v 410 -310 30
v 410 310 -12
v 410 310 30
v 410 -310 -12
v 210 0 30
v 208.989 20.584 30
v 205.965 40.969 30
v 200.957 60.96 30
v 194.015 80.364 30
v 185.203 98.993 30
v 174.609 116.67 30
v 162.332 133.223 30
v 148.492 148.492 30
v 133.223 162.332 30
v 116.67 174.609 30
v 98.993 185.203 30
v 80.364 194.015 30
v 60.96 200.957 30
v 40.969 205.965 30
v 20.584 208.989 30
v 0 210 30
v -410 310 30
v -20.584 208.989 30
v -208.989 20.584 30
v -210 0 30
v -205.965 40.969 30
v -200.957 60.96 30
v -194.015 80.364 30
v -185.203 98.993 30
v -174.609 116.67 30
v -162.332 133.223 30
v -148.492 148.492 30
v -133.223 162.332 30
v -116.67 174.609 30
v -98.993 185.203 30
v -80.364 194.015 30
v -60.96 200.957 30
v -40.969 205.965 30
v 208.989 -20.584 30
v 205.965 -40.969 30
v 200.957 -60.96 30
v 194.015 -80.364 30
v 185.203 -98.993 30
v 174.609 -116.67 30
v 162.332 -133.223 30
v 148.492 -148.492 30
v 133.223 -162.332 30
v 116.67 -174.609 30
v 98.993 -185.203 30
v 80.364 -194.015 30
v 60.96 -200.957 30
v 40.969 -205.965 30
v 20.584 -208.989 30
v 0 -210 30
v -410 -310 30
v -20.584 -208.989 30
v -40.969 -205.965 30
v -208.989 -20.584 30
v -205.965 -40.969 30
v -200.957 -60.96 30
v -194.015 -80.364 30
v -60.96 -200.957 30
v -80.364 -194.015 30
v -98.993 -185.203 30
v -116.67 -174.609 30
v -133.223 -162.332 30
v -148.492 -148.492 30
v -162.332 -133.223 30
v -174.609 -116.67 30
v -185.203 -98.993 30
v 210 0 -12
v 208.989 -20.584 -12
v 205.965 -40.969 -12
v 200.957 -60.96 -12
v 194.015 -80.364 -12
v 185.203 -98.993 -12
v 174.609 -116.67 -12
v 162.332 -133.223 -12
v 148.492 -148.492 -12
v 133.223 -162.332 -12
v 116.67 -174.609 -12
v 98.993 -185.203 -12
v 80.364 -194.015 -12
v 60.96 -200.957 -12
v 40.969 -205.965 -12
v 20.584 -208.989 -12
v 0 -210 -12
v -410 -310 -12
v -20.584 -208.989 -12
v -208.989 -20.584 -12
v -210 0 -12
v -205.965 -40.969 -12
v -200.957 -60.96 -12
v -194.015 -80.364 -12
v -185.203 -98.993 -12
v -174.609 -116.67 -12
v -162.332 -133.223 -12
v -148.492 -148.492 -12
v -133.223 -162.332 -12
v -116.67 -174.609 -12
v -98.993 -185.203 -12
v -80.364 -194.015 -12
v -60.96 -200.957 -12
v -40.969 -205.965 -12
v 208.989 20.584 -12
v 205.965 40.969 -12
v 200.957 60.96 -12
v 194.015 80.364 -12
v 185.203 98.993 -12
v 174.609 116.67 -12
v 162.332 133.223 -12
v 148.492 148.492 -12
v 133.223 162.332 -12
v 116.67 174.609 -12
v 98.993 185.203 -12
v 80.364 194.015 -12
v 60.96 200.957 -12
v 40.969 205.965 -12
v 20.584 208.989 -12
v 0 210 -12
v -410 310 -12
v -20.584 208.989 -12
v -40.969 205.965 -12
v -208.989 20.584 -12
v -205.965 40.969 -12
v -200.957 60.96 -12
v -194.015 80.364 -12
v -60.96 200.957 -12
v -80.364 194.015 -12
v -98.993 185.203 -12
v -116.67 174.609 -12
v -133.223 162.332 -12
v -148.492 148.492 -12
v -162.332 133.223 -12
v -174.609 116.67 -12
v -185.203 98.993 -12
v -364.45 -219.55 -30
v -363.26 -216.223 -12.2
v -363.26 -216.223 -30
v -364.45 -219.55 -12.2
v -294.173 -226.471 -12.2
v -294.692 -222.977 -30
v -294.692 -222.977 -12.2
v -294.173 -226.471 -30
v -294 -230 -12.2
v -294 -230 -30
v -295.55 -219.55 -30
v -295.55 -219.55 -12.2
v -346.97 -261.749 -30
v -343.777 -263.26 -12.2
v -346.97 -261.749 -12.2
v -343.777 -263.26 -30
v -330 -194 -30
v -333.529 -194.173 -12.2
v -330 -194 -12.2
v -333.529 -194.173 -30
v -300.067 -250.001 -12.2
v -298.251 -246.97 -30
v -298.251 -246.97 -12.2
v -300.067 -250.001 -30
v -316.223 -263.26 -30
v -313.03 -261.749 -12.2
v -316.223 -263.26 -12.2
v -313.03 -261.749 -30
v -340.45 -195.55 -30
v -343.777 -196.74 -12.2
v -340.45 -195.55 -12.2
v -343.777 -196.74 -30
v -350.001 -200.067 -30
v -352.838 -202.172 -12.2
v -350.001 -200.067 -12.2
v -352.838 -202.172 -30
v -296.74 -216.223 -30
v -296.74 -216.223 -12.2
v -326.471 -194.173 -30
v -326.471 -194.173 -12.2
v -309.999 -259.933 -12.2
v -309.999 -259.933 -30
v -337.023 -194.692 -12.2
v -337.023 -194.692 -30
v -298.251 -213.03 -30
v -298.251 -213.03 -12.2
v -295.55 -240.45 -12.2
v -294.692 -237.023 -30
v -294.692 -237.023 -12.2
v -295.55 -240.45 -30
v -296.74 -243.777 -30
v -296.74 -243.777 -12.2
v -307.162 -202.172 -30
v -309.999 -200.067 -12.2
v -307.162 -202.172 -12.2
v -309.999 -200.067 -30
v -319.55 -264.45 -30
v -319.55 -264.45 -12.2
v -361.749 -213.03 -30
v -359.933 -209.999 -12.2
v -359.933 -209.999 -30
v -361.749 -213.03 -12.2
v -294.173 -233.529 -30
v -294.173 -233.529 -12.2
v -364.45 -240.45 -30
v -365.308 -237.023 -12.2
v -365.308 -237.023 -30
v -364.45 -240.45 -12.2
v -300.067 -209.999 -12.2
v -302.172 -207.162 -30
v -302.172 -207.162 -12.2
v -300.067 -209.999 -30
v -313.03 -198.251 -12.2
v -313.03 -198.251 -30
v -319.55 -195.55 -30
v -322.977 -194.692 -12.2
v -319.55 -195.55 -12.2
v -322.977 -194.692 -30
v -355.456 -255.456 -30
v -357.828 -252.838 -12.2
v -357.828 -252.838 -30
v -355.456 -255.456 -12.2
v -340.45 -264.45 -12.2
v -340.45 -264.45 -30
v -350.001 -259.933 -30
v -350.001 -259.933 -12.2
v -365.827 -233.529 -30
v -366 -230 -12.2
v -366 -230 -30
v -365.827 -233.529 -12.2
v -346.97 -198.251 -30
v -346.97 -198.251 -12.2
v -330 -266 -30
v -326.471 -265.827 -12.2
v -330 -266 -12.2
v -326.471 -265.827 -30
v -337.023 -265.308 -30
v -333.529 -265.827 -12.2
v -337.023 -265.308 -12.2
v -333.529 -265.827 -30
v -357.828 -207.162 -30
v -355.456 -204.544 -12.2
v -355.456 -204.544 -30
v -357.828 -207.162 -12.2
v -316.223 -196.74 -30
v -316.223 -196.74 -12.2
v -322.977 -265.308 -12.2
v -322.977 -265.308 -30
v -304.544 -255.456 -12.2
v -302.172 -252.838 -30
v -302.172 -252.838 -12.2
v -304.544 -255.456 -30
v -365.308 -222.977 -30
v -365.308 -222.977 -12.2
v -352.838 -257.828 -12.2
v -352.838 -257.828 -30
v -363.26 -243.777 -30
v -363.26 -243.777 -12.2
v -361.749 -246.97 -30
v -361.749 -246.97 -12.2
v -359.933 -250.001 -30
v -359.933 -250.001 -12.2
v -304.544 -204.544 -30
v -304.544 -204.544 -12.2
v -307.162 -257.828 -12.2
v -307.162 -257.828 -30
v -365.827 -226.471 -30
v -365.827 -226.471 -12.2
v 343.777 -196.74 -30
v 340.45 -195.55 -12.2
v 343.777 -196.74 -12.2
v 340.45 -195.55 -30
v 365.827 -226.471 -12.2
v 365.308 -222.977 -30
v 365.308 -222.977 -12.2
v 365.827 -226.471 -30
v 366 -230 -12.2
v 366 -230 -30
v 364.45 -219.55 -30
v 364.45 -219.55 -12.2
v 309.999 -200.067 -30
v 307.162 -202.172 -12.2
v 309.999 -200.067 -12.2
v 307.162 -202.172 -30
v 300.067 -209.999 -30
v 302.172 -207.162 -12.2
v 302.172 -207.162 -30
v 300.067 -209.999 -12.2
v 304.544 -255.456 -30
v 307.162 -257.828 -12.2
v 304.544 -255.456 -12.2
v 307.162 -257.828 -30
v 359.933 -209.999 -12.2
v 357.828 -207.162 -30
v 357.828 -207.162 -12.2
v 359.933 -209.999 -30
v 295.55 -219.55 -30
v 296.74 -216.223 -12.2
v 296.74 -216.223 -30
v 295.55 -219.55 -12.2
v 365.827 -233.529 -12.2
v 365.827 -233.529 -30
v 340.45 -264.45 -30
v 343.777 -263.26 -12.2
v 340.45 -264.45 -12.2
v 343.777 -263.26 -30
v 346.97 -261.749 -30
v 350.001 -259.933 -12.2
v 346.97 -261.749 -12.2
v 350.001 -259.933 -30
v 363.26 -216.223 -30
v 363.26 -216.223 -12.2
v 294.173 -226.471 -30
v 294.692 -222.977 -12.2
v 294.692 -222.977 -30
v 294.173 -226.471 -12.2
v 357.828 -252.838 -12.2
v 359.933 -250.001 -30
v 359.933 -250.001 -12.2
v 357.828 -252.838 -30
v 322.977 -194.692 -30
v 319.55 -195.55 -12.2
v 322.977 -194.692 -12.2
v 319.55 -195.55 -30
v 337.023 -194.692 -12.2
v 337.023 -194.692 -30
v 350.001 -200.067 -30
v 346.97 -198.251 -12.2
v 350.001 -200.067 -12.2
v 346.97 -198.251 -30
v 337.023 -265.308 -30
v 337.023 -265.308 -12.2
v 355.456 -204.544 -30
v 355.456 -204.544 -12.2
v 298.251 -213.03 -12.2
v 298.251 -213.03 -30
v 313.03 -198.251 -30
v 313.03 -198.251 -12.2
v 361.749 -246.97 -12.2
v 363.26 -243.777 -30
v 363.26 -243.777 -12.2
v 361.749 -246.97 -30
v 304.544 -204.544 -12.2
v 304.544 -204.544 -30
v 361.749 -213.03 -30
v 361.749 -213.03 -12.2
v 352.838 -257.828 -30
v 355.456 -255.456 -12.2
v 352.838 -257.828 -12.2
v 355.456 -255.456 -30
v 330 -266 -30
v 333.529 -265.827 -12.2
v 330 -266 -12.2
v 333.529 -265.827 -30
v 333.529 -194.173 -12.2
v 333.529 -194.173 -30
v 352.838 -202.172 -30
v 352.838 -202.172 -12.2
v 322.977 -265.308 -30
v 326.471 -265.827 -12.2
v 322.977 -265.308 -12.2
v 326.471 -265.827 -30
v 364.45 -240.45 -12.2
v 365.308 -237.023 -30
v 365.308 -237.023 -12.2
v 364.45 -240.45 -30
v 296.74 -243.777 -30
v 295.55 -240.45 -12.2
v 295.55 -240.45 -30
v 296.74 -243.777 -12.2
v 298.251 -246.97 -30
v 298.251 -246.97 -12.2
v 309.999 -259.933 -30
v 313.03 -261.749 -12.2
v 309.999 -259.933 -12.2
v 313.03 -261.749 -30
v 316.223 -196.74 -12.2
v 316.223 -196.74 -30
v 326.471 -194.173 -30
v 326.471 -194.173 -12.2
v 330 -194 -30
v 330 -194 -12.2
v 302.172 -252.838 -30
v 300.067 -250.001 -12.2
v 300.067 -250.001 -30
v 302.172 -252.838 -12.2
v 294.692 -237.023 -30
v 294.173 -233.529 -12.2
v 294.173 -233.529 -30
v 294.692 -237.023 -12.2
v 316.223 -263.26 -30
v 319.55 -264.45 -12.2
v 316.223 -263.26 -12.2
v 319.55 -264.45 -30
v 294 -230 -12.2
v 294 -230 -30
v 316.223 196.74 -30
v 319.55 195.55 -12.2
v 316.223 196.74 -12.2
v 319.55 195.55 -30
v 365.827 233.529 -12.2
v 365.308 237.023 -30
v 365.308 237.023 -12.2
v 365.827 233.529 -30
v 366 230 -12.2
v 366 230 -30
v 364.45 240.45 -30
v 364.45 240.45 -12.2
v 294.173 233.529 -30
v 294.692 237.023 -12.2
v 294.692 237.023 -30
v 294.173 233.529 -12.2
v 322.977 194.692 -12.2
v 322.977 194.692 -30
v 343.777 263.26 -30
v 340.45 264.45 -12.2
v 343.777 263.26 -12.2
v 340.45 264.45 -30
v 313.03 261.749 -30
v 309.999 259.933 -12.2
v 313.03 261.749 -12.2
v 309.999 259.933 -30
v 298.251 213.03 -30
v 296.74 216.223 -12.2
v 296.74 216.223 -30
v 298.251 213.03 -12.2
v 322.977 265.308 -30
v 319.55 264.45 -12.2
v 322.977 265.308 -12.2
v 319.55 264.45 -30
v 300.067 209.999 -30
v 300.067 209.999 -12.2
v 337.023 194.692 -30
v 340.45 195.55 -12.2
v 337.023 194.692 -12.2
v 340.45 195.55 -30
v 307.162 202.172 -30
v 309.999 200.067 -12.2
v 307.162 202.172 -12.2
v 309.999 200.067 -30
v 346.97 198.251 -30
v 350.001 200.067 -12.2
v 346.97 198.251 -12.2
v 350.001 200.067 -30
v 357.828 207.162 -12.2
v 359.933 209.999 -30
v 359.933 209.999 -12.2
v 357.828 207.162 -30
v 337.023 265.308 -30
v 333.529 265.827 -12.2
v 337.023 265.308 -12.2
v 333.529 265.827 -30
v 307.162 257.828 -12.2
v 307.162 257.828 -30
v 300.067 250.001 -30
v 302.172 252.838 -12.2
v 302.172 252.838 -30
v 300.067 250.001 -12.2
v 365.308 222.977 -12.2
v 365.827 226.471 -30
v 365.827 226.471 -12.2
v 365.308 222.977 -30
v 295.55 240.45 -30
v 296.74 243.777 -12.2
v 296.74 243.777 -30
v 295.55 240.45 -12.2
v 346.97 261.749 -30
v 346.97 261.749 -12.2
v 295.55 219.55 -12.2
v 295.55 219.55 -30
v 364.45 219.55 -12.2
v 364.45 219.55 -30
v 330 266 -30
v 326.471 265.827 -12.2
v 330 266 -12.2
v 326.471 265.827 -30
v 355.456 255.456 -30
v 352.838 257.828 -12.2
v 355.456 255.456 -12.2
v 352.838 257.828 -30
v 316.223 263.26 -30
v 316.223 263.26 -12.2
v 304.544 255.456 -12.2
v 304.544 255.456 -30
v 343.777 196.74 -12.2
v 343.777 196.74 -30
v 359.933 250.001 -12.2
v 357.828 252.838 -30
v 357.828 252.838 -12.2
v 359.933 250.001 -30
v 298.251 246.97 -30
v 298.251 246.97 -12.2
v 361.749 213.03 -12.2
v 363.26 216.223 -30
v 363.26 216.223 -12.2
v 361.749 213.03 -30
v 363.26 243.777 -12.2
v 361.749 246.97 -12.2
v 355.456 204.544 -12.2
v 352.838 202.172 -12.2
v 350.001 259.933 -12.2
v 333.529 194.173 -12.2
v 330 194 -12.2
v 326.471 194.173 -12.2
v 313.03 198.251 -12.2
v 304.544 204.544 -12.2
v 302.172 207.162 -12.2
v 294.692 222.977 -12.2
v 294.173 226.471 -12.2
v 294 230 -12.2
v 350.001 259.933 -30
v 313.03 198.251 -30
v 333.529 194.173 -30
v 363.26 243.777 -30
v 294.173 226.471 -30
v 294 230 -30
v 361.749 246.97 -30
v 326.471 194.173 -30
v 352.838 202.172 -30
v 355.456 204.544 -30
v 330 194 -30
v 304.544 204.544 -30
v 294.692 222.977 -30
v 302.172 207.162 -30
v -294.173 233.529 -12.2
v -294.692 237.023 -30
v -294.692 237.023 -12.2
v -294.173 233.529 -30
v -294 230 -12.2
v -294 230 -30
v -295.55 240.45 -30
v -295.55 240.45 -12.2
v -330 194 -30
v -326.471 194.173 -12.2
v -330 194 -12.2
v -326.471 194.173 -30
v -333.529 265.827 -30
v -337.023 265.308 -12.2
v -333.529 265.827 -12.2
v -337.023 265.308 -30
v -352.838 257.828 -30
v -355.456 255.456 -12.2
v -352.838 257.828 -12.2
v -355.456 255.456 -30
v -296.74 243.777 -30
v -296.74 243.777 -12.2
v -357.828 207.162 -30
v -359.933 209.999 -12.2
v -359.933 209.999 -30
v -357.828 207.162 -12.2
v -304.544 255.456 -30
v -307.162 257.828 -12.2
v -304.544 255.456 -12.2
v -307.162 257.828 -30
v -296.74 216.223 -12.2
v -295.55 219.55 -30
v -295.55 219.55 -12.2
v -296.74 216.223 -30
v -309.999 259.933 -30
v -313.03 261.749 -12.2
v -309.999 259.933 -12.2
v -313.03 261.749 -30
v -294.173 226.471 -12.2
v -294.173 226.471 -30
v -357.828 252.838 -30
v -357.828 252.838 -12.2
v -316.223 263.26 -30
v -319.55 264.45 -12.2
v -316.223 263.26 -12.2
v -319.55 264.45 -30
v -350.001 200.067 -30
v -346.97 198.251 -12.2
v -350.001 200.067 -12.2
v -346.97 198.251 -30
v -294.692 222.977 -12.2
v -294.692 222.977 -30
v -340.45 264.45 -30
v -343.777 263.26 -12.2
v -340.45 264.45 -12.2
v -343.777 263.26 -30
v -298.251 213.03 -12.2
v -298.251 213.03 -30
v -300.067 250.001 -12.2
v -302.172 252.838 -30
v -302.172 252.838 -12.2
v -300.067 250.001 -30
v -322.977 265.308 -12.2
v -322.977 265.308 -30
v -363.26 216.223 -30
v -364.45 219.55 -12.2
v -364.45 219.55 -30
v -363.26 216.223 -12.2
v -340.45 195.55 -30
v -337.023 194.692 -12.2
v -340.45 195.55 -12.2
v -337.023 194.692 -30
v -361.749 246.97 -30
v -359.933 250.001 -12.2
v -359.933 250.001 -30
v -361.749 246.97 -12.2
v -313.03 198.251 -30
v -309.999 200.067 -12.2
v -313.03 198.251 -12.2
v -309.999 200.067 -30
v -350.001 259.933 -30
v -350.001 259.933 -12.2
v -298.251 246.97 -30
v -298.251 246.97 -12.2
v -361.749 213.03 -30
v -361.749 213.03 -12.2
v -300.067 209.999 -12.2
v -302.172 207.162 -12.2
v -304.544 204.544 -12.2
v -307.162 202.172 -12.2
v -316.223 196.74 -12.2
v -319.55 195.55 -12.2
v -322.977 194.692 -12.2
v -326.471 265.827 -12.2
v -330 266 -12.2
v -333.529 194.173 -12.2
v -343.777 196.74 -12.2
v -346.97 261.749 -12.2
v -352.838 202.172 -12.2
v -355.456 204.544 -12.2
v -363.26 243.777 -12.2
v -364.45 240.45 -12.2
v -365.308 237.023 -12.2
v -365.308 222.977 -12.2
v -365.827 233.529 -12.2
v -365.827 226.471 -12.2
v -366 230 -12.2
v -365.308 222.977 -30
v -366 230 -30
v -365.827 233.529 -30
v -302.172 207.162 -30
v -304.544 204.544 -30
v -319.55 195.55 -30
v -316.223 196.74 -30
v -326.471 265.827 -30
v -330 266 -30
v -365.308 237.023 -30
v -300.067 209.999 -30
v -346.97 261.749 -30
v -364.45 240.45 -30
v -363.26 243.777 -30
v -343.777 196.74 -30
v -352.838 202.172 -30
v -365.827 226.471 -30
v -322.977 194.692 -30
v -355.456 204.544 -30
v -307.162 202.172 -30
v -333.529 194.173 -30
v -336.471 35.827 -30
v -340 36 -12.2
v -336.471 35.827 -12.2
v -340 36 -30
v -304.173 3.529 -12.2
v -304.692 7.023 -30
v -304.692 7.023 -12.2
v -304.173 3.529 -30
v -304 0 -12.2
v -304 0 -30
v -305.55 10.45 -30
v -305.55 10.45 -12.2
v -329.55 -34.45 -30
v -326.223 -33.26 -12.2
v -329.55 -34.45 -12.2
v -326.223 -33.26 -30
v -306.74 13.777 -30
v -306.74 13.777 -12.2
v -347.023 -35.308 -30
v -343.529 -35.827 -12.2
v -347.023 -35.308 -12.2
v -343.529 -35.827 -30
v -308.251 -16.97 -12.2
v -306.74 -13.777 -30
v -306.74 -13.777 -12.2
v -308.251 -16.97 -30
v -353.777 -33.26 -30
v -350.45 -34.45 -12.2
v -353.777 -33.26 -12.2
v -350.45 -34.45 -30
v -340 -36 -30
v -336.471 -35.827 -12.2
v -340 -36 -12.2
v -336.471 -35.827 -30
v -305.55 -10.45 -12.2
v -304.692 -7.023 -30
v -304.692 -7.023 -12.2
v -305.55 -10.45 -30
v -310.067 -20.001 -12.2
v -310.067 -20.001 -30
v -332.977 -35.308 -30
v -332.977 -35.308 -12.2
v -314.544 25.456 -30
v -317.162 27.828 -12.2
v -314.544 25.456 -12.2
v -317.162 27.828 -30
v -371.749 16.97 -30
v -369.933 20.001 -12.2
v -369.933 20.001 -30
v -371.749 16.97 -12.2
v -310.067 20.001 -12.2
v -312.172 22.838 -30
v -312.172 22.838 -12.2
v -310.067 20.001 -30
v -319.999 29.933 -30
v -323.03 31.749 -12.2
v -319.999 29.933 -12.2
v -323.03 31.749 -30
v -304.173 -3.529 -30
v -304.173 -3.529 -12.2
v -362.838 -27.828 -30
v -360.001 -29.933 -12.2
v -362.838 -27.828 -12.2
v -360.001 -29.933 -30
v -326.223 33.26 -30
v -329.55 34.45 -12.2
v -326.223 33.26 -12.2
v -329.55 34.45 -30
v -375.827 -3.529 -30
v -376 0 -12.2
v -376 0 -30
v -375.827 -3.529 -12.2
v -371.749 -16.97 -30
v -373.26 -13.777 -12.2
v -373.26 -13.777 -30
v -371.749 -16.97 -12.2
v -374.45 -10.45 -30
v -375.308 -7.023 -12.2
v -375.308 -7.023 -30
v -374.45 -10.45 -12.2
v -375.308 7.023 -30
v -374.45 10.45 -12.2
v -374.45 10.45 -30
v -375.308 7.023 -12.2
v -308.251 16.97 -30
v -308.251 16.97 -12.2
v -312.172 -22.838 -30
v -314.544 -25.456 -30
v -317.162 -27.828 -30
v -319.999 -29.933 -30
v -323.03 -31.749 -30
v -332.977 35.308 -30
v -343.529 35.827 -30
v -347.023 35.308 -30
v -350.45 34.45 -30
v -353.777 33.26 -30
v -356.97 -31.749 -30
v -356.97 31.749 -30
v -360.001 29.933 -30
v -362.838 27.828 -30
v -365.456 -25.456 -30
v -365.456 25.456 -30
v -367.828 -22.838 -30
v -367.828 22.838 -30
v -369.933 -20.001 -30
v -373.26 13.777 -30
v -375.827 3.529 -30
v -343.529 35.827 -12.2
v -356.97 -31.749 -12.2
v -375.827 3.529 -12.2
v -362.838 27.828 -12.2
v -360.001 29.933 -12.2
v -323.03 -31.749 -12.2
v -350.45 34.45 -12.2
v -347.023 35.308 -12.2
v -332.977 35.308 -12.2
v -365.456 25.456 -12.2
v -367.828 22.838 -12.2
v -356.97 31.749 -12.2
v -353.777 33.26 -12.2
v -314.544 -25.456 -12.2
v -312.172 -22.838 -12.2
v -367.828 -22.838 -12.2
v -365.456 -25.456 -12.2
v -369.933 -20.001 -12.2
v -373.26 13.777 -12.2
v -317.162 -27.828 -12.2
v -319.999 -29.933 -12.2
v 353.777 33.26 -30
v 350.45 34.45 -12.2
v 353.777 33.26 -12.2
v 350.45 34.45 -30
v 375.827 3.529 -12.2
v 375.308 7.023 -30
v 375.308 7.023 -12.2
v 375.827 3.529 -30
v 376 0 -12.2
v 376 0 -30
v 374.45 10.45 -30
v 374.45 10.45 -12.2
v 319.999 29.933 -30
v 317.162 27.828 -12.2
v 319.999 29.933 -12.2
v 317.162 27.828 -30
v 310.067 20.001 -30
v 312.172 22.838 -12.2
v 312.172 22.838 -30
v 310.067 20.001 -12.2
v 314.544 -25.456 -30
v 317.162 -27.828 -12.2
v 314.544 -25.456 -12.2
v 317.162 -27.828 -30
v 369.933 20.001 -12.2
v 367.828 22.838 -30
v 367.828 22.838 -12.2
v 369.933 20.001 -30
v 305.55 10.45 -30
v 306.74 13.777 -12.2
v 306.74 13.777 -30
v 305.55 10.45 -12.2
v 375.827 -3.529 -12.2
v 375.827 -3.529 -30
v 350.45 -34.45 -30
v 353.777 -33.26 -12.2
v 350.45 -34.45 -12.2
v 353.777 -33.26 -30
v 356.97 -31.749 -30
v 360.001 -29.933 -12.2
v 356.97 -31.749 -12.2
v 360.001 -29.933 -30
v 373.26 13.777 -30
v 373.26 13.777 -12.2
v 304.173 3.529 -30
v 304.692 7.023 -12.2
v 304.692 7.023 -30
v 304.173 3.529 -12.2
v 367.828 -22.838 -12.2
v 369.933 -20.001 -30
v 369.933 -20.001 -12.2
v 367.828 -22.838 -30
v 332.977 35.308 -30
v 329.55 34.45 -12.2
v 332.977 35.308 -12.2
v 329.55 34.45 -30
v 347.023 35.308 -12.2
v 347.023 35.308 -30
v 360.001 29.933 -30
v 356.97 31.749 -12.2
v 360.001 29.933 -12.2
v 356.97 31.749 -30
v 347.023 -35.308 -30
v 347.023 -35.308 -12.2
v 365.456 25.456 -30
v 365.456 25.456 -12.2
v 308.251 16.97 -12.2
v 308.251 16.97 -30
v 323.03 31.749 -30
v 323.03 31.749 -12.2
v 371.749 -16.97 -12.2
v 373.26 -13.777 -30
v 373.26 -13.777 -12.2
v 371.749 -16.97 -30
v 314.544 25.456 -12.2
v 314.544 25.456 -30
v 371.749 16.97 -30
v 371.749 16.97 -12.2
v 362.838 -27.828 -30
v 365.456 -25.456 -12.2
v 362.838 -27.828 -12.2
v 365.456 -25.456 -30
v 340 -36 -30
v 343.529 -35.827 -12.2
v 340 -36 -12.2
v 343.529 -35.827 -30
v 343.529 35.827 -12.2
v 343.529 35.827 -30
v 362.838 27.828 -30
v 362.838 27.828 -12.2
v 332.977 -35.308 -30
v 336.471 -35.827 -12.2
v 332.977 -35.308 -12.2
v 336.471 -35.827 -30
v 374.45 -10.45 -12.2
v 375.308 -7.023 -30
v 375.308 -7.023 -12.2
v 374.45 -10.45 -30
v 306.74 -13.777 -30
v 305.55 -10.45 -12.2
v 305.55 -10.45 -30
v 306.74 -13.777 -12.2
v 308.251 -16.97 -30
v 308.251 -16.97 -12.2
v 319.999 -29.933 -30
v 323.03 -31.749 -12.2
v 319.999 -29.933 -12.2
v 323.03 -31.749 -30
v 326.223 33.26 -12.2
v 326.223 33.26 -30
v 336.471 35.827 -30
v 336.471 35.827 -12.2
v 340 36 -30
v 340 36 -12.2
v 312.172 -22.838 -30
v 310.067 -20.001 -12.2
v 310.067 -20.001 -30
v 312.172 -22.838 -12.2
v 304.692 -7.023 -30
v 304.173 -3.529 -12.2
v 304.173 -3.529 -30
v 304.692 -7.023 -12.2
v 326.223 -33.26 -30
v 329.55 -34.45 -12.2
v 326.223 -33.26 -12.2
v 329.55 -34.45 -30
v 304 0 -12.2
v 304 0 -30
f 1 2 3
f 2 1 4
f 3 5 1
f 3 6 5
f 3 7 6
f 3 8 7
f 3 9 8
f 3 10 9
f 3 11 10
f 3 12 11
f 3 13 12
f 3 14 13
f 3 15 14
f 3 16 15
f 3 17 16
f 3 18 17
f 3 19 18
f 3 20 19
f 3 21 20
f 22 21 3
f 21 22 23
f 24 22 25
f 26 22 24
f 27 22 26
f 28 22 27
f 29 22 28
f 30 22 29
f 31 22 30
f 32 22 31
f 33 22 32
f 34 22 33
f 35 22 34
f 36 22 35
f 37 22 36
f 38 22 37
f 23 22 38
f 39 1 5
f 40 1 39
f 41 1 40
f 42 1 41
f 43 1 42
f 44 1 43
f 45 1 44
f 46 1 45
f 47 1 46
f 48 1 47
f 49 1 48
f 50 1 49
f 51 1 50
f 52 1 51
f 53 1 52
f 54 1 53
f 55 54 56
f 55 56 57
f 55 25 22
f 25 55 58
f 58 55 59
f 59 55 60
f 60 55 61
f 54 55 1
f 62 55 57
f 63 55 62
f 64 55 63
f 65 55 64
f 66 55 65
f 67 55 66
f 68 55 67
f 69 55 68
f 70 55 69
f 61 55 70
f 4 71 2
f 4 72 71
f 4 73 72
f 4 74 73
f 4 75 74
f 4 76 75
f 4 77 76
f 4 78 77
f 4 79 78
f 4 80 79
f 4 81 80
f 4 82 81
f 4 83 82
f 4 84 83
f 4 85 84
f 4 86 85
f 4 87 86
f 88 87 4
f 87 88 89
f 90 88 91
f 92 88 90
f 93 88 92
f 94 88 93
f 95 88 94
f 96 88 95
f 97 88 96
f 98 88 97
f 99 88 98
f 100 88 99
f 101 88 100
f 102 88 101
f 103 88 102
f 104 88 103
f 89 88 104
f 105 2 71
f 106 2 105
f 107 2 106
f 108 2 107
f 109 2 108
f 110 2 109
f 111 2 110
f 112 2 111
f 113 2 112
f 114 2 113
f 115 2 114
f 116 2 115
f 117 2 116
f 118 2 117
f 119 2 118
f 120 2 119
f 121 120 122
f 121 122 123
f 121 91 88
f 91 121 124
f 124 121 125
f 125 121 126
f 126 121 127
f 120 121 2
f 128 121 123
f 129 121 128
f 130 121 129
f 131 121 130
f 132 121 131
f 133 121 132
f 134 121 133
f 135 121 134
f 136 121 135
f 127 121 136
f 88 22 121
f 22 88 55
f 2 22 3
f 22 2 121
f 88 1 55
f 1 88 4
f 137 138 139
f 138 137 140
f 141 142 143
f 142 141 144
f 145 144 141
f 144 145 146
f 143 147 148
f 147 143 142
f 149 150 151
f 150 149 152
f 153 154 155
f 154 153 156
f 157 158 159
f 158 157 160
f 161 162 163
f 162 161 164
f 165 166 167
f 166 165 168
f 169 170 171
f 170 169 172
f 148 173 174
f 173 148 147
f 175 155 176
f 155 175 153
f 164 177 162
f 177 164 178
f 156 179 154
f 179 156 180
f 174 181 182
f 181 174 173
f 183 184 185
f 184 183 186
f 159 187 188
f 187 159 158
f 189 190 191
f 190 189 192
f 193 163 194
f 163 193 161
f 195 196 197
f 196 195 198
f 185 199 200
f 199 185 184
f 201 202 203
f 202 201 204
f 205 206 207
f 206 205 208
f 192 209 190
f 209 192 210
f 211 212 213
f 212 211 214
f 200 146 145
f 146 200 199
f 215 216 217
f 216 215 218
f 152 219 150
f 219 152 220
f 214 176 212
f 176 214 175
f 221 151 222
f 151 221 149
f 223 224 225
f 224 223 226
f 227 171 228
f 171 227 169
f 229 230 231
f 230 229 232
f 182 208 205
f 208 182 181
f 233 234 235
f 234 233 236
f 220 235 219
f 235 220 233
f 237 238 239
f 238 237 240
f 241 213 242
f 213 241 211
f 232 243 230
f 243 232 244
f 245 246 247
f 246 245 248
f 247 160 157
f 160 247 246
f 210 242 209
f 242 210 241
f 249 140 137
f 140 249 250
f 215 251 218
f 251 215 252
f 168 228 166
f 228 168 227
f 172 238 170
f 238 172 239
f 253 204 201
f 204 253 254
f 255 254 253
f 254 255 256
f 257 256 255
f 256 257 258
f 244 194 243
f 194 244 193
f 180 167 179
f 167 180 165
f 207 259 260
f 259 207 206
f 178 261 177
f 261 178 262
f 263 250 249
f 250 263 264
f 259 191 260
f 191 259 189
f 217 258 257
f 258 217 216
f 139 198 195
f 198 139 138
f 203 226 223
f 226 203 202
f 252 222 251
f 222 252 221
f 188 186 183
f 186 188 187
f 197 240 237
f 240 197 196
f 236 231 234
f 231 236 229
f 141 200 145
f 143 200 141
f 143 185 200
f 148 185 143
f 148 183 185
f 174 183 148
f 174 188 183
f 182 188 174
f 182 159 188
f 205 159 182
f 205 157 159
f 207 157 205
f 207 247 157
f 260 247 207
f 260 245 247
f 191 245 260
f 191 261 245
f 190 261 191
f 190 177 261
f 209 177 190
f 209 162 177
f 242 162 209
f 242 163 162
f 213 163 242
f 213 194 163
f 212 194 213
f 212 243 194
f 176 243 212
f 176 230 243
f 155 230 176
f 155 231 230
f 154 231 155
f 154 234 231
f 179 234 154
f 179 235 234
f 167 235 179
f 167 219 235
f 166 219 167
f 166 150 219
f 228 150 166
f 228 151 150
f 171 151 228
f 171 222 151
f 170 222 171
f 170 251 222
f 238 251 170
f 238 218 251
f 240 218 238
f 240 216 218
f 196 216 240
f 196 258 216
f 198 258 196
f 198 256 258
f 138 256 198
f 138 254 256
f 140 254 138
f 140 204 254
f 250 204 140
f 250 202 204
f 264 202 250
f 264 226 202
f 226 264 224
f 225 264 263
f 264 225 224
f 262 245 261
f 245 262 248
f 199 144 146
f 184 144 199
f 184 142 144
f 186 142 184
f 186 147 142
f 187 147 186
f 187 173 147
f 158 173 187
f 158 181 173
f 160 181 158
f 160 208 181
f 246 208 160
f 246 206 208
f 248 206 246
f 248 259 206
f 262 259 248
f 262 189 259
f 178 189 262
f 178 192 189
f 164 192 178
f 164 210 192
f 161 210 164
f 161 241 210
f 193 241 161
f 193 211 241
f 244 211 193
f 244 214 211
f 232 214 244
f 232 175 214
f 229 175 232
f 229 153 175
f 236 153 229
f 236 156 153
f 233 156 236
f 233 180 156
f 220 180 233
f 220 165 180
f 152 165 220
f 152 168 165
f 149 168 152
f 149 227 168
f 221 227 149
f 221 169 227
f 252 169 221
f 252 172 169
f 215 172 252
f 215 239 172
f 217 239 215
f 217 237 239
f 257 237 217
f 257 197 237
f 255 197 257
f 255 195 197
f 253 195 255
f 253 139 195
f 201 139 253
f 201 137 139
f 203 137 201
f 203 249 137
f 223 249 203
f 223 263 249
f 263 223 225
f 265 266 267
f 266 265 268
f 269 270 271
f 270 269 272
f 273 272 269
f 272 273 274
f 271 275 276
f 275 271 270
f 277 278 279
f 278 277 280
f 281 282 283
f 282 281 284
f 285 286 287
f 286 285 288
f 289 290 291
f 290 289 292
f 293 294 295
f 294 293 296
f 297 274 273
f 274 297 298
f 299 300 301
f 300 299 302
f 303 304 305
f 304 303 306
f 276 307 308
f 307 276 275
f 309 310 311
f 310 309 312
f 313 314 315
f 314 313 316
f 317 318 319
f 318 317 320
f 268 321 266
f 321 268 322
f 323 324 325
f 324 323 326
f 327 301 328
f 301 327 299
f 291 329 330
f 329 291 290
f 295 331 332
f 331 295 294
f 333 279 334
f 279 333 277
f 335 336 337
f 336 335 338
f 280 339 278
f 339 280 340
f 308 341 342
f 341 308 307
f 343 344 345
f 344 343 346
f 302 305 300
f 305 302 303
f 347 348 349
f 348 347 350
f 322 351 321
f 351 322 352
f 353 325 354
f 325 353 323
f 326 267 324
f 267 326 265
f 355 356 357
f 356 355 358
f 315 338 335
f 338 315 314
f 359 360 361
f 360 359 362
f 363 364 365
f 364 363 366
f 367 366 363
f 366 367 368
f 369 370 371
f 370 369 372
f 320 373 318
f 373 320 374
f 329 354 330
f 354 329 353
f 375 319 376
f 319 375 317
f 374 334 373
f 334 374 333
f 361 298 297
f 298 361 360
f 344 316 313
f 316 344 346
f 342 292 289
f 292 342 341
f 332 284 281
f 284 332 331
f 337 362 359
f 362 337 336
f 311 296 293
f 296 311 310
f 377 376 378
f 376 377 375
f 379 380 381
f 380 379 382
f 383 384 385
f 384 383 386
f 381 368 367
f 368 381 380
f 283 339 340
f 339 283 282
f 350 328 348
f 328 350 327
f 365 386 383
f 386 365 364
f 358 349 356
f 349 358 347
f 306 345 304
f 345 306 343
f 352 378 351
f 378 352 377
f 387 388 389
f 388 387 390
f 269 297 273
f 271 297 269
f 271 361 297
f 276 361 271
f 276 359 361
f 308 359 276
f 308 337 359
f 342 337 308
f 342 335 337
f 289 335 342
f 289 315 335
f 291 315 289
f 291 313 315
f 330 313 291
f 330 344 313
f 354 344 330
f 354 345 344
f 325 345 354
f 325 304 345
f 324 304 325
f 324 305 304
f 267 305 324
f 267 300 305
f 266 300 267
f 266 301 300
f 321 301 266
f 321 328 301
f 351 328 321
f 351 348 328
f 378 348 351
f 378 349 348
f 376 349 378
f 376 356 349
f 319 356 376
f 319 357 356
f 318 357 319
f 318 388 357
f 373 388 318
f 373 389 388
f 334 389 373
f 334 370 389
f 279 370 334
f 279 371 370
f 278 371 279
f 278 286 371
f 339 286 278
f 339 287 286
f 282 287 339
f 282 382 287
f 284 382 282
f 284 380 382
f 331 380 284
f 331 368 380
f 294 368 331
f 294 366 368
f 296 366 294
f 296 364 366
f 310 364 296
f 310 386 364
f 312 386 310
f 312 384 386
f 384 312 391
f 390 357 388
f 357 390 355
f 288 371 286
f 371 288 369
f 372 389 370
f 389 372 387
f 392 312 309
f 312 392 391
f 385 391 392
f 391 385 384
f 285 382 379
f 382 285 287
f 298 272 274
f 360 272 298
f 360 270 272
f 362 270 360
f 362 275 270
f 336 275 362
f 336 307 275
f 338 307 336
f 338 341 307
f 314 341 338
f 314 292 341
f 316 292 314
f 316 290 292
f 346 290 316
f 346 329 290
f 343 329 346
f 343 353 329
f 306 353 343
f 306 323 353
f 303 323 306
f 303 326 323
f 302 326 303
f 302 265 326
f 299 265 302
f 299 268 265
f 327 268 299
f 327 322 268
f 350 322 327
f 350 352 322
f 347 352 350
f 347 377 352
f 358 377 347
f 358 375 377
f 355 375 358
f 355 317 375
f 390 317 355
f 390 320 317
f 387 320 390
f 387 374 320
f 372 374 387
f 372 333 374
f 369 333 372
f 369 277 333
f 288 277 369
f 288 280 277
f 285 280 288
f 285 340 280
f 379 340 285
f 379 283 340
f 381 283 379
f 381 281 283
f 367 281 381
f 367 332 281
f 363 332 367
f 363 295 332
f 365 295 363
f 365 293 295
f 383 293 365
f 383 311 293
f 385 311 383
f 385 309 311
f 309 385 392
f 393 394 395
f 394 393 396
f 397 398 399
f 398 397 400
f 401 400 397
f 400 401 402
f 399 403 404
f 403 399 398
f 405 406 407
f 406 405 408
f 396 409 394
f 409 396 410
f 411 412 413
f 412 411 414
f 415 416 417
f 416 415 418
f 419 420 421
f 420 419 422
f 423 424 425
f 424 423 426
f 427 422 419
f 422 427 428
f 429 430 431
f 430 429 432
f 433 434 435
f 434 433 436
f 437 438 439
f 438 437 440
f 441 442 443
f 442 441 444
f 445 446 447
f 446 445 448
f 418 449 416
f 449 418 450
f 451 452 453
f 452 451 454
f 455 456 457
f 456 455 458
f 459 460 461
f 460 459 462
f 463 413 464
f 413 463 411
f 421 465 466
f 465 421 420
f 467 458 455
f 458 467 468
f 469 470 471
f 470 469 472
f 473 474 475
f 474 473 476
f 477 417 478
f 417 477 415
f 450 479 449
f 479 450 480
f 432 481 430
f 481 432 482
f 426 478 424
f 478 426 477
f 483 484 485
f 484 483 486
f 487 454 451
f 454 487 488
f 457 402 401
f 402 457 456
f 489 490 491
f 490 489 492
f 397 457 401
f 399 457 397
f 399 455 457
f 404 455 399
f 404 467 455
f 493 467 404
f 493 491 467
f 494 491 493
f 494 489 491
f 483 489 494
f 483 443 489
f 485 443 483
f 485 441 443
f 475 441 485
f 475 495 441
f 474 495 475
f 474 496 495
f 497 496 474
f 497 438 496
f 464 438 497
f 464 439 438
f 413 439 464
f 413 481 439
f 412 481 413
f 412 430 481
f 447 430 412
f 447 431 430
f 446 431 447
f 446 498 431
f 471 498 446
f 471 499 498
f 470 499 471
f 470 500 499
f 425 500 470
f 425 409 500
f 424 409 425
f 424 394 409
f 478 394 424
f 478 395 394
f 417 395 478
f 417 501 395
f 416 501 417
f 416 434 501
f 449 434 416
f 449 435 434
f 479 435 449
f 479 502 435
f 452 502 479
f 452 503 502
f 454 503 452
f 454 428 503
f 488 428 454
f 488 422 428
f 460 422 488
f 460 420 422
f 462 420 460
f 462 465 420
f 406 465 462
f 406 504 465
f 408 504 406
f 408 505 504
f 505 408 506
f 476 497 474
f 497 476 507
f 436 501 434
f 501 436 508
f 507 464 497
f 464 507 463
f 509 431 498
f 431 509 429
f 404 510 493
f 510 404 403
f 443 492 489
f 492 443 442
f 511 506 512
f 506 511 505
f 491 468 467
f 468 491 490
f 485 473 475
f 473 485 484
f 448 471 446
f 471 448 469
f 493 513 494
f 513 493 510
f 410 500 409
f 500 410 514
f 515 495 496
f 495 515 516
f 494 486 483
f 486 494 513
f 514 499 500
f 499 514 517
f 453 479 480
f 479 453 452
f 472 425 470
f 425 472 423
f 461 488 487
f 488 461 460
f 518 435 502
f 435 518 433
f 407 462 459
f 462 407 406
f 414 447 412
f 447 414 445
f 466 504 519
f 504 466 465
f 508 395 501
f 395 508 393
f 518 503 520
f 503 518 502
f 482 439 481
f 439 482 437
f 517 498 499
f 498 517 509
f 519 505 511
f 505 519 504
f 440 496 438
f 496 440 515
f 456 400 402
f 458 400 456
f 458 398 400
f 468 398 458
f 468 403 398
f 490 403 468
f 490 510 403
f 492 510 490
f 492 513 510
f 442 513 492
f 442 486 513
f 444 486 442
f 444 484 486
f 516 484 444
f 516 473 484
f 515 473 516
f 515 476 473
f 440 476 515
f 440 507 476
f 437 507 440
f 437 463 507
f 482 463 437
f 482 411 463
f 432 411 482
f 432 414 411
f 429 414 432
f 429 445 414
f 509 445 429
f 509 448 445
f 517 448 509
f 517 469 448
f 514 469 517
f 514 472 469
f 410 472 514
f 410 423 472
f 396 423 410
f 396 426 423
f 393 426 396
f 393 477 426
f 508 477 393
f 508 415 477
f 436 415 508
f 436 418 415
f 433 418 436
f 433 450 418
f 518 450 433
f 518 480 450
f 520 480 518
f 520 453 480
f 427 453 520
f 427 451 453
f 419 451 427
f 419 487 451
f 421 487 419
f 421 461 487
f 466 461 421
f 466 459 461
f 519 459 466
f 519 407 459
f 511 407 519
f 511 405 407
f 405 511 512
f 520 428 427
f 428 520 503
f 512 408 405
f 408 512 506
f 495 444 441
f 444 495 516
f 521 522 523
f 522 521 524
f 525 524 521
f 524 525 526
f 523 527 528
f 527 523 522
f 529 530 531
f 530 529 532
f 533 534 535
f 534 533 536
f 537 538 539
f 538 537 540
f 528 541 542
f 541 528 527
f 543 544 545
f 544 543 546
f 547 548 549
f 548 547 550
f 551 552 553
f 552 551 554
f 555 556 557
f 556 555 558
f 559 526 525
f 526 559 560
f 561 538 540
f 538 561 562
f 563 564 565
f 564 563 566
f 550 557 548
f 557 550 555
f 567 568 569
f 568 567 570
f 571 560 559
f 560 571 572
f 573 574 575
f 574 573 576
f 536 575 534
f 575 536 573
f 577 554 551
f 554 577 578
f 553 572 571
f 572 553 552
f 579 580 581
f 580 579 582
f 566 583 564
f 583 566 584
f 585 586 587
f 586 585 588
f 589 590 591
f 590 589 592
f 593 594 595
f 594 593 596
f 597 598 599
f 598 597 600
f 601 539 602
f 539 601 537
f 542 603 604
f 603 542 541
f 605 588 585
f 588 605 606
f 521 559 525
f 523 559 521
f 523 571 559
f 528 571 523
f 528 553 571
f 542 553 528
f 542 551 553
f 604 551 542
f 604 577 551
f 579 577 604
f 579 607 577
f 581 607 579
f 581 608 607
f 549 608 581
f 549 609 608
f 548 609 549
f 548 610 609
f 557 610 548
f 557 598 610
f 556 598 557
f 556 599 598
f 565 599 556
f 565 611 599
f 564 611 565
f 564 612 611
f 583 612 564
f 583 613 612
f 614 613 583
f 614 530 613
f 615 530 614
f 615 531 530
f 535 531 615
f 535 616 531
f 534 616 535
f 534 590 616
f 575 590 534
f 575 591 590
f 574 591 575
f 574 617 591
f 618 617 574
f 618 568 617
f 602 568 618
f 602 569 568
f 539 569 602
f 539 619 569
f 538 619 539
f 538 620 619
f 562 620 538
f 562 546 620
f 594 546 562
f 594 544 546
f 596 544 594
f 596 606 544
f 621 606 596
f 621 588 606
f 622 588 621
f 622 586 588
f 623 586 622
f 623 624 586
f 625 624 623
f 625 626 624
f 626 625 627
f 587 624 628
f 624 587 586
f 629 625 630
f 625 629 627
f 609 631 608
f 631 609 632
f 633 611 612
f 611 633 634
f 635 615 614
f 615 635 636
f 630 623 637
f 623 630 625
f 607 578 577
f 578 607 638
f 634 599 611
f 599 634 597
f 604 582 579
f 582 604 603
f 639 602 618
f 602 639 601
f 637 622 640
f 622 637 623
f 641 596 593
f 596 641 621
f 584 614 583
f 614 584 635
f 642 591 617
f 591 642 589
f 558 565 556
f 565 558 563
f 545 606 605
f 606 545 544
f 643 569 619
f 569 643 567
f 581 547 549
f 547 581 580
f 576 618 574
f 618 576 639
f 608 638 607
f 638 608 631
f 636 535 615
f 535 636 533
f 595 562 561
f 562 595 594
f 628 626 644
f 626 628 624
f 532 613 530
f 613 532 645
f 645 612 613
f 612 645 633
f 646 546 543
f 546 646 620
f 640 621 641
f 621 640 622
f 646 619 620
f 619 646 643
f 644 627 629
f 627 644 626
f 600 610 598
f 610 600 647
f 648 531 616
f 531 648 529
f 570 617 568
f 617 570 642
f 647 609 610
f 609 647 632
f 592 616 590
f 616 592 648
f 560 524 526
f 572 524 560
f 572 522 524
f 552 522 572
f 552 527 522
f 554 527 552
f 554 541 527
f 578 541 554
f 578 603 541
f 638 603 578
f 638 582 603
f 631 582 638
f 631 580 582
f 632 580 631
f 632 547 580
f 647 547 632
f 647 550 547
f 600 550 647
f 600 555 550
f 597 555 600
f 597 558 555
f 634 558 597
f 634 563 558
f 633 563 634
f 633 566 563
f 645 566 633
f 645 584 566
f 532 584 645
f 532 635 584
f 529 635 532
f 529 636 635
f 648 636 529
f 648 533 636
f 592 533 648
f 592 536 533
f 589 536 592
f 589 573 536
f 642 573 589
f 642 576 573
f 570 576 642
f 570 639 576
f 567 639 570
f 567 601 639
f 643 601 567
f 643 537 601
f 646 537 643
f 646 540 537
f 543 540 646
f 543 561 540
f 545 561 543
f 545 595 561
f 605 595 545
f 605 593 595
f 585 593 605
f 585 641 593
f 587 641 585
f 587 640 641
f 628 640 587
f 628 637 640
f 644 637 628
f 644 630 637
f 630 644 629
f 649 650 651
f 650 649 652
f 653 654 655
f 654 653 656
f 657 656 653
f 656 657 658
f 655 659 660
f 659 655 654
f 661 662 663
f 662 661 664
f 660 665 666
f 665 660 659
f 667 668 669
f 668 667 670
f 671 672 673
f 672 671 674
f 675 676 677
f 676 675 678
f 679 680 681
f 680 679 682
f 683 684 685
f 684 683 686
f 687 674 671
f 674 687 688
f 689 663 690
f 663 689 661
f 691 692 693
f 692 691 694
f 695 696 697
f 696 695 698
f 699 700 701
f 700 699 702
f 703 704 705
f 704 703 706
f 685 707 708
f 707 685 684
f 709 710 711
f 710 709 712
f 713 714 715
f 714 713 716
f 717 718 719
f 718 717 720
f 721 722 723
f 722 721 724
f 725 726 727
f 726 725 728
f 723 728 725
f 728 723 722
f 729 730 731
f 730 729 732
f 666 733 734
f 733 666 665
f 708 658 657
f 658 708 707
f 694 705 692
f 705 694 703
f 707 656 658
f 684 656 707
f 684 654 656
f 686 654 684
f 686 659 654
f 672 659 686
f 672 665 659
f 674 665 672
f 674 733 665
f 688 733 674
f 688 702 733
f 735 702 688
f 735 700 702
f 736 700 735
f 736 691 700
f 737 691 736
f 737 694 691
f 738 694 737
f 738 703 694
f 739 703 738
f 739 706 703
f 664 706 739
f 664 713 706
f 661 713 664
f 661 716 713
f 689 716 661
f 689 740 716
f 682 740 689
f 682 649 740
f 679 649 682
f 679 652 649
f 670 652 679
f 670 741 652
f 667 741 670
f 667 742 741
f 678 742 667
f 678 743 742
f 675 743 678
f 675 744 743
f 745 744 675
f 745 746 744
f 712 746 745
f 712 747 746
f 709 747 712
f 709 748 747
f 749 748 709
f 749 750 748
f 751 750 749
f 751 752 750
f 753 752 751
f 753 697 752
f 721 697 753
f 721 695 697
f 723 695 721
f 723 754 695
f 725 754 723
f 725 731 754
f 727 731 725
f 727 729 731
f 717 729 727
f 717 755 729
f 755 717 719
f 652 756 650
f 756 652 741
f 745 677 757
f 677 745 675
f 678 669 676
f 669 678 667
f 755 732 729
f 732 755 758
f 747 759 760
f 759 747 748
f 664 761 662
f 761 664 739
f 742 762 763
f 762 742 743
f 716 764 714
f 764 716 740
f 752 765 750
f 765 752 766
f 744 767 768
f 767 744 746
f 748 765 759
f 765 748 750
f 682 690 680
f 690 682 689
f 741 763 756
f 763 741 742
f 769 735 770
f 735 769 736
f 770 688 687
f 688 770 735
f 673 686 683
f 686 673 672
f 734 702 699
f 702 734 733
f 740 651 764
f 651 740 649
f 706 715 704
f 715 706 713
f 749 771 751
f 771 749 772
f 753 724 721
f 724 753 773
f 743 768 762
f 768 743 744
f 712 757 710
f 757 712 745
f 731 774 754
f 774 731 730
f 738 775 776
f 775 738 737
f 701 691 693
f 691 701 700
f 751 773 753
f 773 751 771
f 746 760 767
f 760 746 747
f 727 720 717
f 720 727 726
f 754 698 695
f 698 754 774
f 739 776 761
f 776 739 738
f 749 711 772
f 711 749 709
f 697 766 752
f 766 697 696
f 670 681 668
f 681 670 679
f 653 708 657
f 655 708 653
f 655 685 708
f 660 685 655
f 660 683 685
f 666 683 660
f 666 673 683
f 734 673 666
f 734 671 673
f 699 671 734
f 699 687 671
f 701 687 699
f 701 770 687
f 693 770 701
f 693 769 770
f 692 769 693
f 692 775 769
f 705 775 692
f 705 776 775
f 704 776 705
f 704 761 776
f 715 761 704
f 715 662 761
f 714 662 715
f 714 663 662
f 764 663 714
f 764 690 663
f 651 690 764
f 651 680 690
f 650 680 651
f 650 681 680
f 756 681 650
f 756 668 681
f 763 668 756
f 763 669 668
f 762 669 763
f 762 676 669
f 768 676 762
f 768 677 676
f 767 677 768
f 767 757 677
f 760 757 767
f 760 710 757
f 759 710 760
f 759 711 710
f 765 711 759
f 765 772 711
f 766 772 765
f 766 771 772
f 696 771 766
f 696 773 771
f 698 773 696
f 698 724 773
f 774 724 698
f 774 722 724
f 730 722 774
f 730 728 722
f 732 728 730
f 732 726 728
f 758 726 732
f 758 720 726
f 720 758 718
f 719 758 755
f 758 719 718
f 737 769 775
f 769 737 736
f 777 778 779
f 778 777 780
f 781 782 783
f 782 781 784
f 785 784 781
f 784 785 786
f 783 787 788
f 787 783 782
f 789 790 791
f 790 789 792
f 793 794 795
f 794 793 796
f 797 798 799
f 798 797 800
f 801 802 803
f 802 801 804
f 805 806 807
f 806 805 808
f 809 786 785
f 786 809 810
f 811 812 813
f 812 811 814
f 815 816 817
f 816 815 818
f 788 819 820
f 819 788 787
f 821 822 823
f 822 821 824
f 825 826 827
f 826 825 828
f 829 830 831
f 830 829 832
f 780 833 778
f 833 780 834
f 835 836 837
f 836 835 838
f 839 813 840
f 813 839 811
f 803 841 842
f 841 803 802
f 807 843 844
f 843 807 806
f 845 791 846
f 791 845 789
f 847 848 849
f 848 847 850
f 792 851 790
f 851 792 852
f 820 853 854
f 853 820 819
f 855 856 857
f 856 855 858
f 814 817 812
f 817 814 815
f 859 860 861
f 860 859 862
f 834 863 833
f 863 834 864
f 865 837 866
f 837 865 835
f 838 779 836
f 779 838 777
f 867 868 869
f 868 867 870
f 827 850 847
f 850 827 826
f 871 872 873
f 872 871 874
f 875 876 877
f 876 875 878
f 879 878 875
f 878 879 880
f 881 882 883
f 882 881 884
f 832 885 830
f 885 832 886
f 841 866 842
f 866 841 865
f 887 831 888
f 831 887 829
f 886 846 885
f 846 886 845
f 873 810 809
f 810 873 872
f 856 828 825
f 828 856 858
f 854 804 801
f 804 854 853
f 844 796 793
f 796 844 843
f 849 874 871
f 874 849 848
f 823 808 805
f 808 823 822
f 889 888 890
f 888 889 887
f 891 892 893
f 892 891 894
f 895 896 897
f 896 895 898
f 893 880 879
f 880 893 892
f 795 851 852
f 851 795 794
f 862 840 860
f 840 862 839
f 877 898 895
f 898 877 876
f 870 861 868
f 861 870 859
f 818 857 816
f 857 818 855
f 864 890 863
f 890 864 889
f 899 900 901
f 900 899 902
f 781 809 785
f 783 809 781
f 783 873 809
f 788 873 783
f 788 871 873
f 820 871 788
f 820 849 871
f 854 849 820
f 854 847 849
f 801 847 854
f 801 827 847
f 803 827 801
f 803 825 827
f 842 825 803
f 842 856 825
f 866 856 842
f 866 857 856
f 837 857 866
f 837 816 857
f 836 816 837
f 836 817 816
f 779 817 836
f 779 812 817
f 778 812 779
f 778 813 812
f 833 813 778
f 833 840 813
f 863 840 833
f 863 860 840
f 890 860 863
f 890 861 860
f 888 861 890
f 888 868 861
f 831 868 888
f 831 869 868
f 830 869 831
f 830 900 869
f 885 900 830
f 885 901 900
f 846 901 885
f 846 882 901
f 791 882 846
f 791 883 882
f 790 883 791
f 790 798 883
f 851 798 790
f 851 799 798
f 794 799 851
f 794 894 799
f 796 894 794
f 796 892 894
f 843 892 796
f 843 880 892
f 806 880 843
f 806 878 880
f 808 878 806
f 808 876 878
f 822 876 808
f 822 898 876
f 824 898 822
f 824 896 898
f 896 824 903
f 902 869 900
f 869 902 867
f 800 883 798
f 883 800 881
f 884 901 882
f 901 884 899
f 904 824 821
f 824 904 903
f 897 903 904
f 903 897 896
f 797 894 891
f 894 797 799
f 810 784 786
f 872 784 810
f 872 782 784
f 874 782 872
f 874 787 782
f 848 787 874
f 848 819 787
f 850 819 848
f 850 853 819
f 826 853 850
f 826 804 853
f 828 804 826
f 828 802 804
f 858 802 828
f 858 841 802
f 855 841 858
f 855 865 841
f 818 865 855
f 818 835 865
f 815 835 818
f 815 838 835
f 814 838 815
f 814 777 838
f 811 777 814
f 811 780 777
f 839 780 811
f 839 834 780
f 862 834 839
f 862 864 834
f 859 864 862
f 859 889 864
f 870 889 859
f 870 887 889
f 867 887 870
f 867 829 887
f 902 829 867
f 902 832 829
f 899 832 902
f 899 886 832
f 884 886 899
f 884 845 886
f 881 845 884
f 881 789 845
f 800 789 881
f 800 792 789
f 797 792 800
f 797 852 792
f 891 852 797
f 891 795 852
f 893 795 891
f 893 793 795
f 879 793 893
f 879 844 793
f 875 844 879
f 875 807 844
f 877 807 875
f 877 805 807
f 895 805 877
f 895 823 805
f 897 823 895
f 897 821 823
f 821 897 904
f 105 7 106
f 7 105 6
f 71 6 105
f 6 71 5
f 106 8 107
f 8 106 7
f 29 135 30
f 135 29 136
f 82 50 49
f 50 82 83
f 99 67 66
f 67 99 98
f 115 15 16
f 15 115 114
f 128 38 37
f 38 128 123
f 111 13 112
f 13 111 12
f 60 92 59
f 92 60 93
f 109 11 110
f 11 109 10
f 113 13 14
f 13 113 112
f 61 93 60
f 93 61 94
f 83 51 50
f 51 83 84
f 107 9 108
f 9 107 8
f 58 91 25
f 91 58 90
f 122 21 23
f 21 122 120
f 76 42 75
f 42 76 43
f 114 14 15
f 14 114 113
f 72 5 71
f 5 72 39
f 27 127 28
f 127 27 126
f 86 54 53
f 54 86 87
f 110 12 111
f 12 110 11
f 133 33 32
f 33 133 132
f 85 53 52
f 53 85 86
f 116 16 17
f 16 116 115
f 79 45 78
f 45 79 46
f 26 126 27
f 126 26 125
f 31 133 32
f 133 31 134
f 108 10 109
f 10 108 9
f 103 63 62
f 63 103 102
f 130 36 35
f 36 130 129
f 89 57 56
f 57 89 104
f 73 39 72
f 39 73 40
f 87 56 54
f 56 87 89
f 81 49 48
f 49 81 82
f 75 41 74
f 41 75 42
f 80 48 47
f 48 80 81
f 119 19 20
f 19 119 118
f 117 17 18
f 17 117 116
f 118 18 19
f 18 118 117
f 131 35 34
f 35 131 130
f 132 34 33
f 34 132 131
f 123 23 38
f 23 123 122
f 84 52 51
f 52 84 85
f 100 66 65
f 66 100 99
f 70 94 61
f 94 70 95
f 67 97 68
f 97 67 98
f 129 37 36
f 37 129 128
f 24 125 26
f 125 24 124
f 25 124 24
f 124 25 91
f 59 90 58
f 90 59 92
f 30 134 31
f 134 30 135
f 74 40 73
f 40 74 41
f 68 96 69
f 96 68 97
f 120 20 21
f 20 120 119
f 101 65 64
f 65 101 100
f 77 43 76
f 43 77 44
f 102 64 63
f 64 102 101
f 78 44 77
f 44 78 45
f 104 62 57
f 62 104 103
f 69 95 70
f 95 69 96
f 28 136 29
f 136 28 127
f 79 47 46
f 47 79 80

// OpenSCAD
// ============================================================================
// Atom Lithography Machine — Parametric OpenSCAD Module (S4.2-01)
// ============================================================================
// part_id           : S4.2-01
// parent_bom_id     : S4.2
// subsystem         : S4
// part_name         : Aktif piezo titresim sonumleme tablasi (6-DOF, Herzan/Accurion sinifi)
// material          : Al 6061
// temp_stage        : 300 K
// vacuum_grade      : Atmosfer
// tolerance         : ±0.5 nm artik
// computed_mass_kg  : 35.11084
// envelope_mm       : 820.000 x 620.000 x 60.000
// design_maturity   : M0_M1_DETAILED_CAD_DESIGN_ONLY
// no_lab_measurement: true
// iec61508_certified: false
// semi_s2_certified : false
// Units: millimeters (mm)
// ============================================================================

$fn = 64;

// Nominal bounding envelope parameters (mm)
bbox_x = 820.0000;
bbox_y = 620.0000;
bbox_z = 60.0000;

// Part-specific parametric dimensions
table_x_mm = 820.0;
table_y_mm = 620.0;
table_h_mm = 60.0;
n_piezo_pods = 6;
dr_bore_d_mm = 420.0;

// Interface / port parameters (mm)
port_uhv_chamber_cf400_seat_od = 456.000;
port_uhv_chamber_cf400_seat_bore = 420.000;

module part_S4_2_01() {
  difference() {
    union() {
      // Active 6-DOF Al-honeycomb top table (820x620x42 mm)
      translate([0.000, 0.000, 9.000]) cube([820.000, 620.000, 42.000], center=true);
      // 6-DOF active piezo actuator cartridge #1
      translate([-330.000, -230.000, -21.100]) cylinder(d=72.000, h=17.800, center=true);
      // 6-DOF active piezo actuator cartridge #2
      translate([330.000, -230.000, -21.100]) cylinder(d=72.000, h=17.800, center=true);
      // 6-DOF active piezo actuator cartridge #3
      translate([330.000, 230.000, -21.100]) cylinder(d=72.000, h=17.800, center=true);
      // 6-DOF active piezo actuator cartridge #4
      translate([-330.000, 230.000, -21.100]) cylinder(d=72.000, h=17.800, center=true);
      // 6-DOF active piezo actuator cartridge #5
      translate([-340.000, 0.000, -21.100]) cylinder(d=72.000, h=17.800, center=true);
      // 6-DOF active piezo actuator cartridge #6
      translate([340.000, 0.000, -21.100]) cylinder(d=72.000, h=17.800, center=true);
    }
    // Central Ø420 mm (R=210 mm) DR clear bore
    translate([0.000, 0.000, 9.000]) cylinder(d=420.000, h=46.000, center=true);
  }
}

// World assembly mounting transform (global machine frame, mm / deg):
// translate([0.000, 0.000, -270.000]) rotate([0.000, 0.000, 0.000]) part_S4_2_01();

part_S4_2_01();
